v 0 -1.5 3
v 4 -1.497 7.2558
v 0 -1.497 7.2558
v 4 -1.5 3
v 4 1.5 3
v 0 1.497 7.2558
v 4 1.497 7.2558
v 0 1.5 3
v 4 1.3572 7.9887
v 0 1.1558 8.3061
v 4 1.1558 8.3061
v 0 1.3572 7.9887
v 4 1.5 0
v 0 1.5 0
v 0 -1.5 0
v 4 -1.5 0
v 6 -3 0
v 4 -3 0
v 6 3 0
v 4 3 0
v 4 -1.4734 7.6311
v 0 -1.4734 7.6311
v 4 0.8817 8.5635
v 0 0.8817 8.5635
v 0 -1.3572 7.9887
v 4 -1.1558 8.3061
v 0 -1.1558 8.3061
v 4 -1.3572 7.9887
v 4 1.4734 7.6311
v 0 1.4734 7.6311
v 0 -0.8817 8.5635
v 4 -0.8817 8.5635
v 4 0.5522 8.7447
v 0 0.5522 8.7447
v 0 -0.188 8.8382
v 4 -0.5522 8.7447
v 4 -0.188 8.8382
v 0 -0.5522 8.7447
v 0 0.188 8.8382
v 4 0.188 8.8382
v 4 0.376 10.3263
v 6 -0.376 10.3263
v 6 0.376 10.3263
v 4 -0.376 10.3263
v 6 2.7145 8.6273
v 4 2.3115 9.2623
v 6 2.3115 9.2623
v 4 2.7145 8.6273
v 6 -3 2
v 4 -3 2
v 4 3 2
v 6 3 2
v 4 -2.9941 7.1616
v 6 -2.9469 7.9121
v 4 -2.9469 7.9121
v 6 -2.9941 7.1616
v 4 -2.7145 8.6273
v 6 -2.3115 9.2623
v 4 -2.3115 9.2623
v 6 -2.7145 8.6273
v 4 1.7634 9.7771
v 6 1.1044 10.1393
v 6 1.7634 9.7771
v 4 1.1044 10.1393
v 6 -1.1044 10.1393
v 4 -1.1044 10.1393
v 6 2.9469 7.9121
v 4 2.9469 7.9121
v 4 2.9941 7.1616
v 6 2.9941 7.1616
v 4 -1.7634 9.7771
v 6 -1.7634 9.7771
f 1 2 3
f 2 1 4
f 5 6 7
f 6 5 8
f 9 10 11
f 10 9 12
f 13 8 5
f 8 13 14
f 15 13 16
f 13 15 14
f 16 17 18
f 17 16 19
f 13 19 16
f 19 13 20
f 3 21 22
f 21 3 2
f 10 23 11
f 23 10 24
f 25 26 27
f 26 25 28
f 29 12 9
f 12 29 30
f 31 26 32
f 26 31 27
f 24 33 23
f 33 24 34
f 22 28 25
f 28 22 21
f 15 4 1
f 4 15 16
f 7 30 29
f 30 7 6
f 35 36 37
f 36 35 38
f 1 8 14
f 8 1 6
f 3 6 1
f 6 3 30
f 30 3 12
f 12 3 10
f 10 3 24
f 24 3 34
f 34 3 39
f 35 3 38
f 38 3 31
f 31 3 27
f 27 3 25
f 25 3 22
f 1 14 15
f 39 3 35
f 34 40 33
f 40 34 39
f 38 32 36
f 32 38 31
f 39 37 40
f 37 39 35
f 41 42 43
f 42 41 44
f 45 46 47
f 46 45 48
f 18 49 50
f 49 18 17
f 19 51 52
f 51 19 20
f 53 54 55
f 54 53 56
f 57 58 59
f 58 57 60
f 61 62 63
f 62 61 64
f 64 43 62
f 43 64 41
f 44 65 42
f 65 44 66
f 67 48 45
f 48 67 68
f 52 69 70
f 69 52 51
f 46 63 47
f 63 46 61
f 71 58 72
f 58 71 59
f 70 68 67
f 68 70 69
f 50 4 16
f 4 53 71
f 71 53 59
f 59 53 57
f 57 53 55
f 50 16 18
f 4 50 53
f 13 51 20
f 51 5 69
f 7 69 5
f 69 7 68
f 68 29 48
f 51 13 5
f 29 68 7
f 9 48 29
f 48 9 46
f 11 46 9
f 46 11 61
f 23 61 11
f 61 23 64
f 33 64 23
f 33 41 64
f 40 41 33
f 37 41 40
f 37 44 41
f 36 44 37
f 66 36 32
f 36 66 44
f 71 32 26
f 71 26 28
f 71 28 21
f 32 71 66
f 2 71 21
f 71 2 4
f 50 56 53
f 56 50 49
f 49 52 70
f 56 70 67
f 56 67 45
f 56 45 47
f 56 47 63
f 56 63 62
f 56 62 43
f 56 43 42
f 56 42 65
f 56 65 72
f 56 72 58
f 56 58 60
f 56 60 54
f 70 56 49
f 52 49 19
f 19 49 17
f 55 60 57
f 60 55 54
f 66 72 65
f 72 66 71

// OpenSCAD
// file: params.scad
/*

Values in `camelCase` are user-variable (within reason); 
values like numNeedles and screwDiam, etc.,  can be modified to
accommodate user preference or hardware subsitution. 

Values in `ALL_CAPS` should be considered CONSTANTS and should
only be modified with *extreme caution* as they will affect the 
relationship between the needles and the cams, which could
prevent stitches from forming correctly.

I recommend only modifying these constants if you are also 
making changes to the cam design in the technical sketch.
*/

$fn = 50;

STANDARD_GAUGE = 4.5;
MID_GAUGE = 6.5;
BULKY_GAUGE = 9.0;
BRIAN_GAUGE = 7.75;

gauge = BRIAN_GAUGE;
// gauge = STANDARD_GAUGE; // I recommend using one of the predefined gauges above
numNeedles = 25;
tolerance = 0.2; // allows a bit of room for parts that have to fit together; adjust according to your printer's precision

// ---
// Hardware dimensions 
// (actual measurements, no tolerances)

// - pan head 6-32 machine screws
screwDiam = 3.45;
screwHeight = 18;
screwHeadDiam = 6.75 + tolerance * 2; 
screwHeadHeight = 2.55 + tolerance * 2;
nutWidth = 7.9;

// - pan head 4-40 machine screws (M3 should also work where these are used)
screwDiamSm = 2.79;
screwHeightSm = 14.62;
screwHeadHeightSm = 2.41 + tolerance * 2;
screwHeadDiamSm = 5.21 + tolerance * 2;
nutHeight = 2.8;

// ---
// Needle dimensions
// - Brother needles
BUTT_HEIGHT = 15;
NEEDLE_WIDTH = 1.25;
NEEDLE_LEG_HEIGHT = 1.85;
HOOK_DIAM = 3.5;

// ---
// Needle Bed Zones
BACK_COVER = 45;
OOW_TRACK = 8;
B_TRACK = 42; // will divvy up working tracks (B & C position) later
C_TRACK = 0;
WORKING_TRACK = B_TRACK + C_TRACK;
HOLD_TRACK = 8;
SPONGE_BAR = 12;
COMB = 29;
NEEDLE_EXTENSION = 34.5;

// ---
// Needle bed dimensions
NEEDLE_BED_DEPTH = BACK_COVER + OOW_TRACK + WORKING_TRACK + HOLD_TRACK + SPONGE_BAR + COMB;
needleBedHeight = screwHeight + 2;
needleSlotHeight = NEEDLE_LEG_HEIGHT * 2 + screwHeadHeight;
needleSlotWidth = NEEDLE_WIDTH + 0.25; // add a small amount of clearance
combWidth = gauge*2/3; // width of cutouts for stitch formation; this gives room for the thickness of the yarn looped around the needle when it pulls back into the slot, but has to balance leaving enough material for the remaining "teeth" to not be too fragile
spongeThickness = 2.5;
spongeBarThickness = needleSlotHeight - NEEDLE_LEG_HEIGHT - spongeThickness;
YARN_DEPOSIT_Y = -155.1;
YARN_DEPOSIT_Z = -needleSlotHeight + HOOK_DIAM;
connectorOffset = 20;

screwPlacement = 3; // how many needles from edge of bed; min 2, max floor(numNeedles/2)

// ---
// Carriage dimensions
// refer to technical sketch
camHeight = BUTT_HEIGHT; // thickness of the tracks the needles ride along
camPlateHeight = 4; // plate behind the cams
CAM_PLATE_WIDTH = 91 * 2; 
CAM_PLATE_DEPTH = NEEDLE_BED_DEPTH - COMB + 6;

railDepth = 8;
railHeight = 8; // ???
xOffset = 16.5;
//vCamScrews = [[34-xOffset, -90.25, 0],[58-xOffset, -74.25, 0],[86-xOffset,-90.25, 0]];

echo(needleSlotHeight);
// main file
include<params.scad>;
//include<needlebed.scad>;

//testPrintM();

#connector();
connector(tolerance=tolerance);
echo(needleBedHeight - (needleSlotHeight + 2));

module testPrintF() {
    difference() {
        translate([0,-25/2,0])
        cube(25);
        translate([-tolerance, 0, -tolerance])
        // female
        connector();
    }
}

module testPrintM() { 
    union() {
        translate([-(25+tolerance),-25/2,0])
        cube(25);
        translate([-tolerance,0,0])
        // male
        connector(tolerance = tolerance);
    }
}


module connector(top = needleBedHeight - (needleSlotHeight + 3), diam = 3, pinWidth = 4, plugDiam = 6, tolerance = 0) {
    union() {
        hull() {
            translate([(pinWidth + tolerance*2)/2 + 0.25,0,(top - tolerance) - (plugDiam - tolerance*2)/2])
            rotate([0,90,0])
            cylinder(h = pinWidth + tolerance*2 + 0.5, d = diam - tolerance*3, center = true, $fn = 25);
            translate([(pinWidth + tolerance*2)/2 + 0.25,0,(diam - tolerance*2)/2])
            cube([pinWidth + tolerance*2 + 0.5,diam - tolerance*2,diam - tolerance*2], center = true);    
        }
        hull() {
            translate([pinWidth/4 + (pinWidth - tolerance/4),0,(top - tolerance) - (plugDiam - tolerance*2)/2])
            rotate([0,90,0])
            cylinder(h = pinWidth/2 - tolerance*2, d = plugDiam - tolerance*3, center = true, $fn = 25);
            translate([pinWidth/4 + (pinWidth - tolerance/4),0,1])
            cube([pinWidth/2 - tolerance*2,plugDiam - tolerance*2,2], center = true);    
        }
}
}
